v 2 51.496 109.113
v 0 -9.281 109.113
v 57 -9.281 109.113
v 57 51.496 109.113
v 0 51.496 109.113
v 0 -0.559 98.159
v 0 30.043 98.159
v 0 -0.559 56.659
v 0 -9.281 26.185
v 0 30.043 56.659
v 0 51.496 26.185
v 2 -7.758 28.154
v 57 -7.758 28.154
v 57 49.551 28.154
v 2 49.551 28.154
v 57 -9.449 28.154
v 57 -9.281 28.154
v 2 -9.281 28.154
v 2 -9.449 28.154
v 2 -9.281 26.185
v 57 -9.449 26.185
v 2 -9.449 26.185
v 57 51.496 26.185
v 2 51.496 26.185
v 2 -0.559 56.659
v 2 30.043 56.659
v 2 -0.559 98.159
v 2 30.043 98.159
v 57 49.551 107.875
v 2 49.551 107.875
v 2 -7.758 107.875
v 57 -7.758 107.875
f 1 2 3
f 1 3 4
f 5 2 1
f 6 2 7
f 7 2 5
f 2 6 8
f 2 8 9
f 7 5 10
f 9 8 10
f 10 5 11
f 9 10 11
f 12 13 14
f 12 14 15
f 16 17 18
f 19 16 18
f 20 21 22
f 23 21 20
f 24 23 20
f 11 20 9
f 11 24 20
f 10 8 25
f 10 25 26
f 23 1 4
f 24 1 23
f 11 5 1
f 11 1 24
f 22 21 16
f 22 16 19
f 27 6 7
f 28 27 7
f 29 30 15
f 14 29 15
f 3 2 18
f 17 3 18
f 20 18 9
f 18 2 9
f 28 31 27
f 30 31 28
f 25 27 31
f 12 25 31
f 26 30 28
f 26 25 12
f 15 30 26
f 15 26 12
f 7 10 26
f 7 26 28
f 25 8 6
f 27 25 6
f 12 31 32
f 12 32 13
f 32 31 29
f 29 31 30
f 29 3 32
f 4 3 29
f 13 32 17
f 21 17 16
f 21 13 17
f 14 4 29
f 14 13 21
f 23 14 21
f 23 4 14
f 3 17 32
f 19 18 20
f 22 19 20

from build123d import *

# Parameters (mm, degrees)
SKETCH1_W           = 82.927984002
SKETCH1_H           = 60.776462656
BOSS_EXTRUDE1_DEPTH = 2
SKETCH2_W           = 82.927984002
SKETCH2_H           = 1.944543981
BOSS_EXTRUDE2_DEPTH = 55
SKETCH3_W           = 82.927984002
SKETCH3_H           = 1.52283727
BOSS_EXTRUDE3_DEPTH = 55
SKETCH4_W           = 1.238263506
SKETCH4_H           = 57.309081405
BOSS_EXTRUDE4_DEPTH = 55
SKETCH5_W           = 55
SKETCH5_H           = 1.968247646
BOSS_EXTRUDE5_DEPTH = 59
SKETCH6_W           = 41.500434797
SKETCH6_H           = 30.602093287
CUT_EXTRUDE1_DEPTH  = 59


with BuildPart() as part:
    # Sketch1 → Boss-Extrude1 (new body)
    with BuildSketch(Plane(origin=(0, 0, 0), x_dir=(0, 0, -1), z_dir=(1, 0, 0))):
        with Locations((-67.649308223, 21.107365524)):
            Rectangle(SKETCH1_W, SKETCH1_H)
    extrude(amount=BOSS_EXTRUDE1_DEPTH)

    # Sketch2 → Boss-Extrude2 (add)
    with BuildSketch(Plane(origin=(2, 0, 0), x_dir=(0, 0, -1), z_dir=(1, 0, 0))):
        with Locations((-67.649308223, 50.523324862)):
            Rectangle(SKETCH2_W, SKETCH2_H)
    extrude(amount=BOSS_EXTRUDE2_DEPTH)

    # Sketch3 → Boss-Extrude3 (add)
    with BuildSketch(Plane(origin=(2, 0, 0), x_dir=(0, 0, -1), z_dir=(1, 0, 0))):
        with Locations((-67.649308223, -8.519447169)):
            Rectangle(SKETCH3_W, SKETCH3_H)
    extrude(amount=BOSS_EXTRUDE3_DEPTH)

    # Sketch4 → Boss-Extrude4 (add)
    with BuildSketch(Plane(origin=(2, 0, 0), x_dir=(0, 0, -1), z_dir=(1, 0, 0))):
        with Locations((-108.494168471, 20.896512169)):
            Rectangle(SKETCH4_W, SKETCH4_H)
    extrude(amount=BOSS_EXTRUDE4_DEPTH)

    # Sketch5 → Boss-Extrude5 (add)
    with BuildSketch(Plane(origin=(0, 49.551052871, 0), x_dir=(-1, 0, 0), z_dir=(0, -1, 0))):
        with Locations((-29.5, -27.169440045)):
            Rectangle(SKETCH5_W, SKETCH5_H)
    extrude(amount=BOSS_EXTRUDE5_DEPTH)

    # Sketch6 → Cut-Extrude1 (cut)
    with BuildSketch(Plane.ZY):
        with Locations((77.408781478, 14.741773436)):
            Rectangle(SKETCH6_W, SKETCH6_H)
    extrude(amount=-CUT_EXTRUDE1_DEPTH, mode=Mode.SUBTRACT)


solid = part.part
